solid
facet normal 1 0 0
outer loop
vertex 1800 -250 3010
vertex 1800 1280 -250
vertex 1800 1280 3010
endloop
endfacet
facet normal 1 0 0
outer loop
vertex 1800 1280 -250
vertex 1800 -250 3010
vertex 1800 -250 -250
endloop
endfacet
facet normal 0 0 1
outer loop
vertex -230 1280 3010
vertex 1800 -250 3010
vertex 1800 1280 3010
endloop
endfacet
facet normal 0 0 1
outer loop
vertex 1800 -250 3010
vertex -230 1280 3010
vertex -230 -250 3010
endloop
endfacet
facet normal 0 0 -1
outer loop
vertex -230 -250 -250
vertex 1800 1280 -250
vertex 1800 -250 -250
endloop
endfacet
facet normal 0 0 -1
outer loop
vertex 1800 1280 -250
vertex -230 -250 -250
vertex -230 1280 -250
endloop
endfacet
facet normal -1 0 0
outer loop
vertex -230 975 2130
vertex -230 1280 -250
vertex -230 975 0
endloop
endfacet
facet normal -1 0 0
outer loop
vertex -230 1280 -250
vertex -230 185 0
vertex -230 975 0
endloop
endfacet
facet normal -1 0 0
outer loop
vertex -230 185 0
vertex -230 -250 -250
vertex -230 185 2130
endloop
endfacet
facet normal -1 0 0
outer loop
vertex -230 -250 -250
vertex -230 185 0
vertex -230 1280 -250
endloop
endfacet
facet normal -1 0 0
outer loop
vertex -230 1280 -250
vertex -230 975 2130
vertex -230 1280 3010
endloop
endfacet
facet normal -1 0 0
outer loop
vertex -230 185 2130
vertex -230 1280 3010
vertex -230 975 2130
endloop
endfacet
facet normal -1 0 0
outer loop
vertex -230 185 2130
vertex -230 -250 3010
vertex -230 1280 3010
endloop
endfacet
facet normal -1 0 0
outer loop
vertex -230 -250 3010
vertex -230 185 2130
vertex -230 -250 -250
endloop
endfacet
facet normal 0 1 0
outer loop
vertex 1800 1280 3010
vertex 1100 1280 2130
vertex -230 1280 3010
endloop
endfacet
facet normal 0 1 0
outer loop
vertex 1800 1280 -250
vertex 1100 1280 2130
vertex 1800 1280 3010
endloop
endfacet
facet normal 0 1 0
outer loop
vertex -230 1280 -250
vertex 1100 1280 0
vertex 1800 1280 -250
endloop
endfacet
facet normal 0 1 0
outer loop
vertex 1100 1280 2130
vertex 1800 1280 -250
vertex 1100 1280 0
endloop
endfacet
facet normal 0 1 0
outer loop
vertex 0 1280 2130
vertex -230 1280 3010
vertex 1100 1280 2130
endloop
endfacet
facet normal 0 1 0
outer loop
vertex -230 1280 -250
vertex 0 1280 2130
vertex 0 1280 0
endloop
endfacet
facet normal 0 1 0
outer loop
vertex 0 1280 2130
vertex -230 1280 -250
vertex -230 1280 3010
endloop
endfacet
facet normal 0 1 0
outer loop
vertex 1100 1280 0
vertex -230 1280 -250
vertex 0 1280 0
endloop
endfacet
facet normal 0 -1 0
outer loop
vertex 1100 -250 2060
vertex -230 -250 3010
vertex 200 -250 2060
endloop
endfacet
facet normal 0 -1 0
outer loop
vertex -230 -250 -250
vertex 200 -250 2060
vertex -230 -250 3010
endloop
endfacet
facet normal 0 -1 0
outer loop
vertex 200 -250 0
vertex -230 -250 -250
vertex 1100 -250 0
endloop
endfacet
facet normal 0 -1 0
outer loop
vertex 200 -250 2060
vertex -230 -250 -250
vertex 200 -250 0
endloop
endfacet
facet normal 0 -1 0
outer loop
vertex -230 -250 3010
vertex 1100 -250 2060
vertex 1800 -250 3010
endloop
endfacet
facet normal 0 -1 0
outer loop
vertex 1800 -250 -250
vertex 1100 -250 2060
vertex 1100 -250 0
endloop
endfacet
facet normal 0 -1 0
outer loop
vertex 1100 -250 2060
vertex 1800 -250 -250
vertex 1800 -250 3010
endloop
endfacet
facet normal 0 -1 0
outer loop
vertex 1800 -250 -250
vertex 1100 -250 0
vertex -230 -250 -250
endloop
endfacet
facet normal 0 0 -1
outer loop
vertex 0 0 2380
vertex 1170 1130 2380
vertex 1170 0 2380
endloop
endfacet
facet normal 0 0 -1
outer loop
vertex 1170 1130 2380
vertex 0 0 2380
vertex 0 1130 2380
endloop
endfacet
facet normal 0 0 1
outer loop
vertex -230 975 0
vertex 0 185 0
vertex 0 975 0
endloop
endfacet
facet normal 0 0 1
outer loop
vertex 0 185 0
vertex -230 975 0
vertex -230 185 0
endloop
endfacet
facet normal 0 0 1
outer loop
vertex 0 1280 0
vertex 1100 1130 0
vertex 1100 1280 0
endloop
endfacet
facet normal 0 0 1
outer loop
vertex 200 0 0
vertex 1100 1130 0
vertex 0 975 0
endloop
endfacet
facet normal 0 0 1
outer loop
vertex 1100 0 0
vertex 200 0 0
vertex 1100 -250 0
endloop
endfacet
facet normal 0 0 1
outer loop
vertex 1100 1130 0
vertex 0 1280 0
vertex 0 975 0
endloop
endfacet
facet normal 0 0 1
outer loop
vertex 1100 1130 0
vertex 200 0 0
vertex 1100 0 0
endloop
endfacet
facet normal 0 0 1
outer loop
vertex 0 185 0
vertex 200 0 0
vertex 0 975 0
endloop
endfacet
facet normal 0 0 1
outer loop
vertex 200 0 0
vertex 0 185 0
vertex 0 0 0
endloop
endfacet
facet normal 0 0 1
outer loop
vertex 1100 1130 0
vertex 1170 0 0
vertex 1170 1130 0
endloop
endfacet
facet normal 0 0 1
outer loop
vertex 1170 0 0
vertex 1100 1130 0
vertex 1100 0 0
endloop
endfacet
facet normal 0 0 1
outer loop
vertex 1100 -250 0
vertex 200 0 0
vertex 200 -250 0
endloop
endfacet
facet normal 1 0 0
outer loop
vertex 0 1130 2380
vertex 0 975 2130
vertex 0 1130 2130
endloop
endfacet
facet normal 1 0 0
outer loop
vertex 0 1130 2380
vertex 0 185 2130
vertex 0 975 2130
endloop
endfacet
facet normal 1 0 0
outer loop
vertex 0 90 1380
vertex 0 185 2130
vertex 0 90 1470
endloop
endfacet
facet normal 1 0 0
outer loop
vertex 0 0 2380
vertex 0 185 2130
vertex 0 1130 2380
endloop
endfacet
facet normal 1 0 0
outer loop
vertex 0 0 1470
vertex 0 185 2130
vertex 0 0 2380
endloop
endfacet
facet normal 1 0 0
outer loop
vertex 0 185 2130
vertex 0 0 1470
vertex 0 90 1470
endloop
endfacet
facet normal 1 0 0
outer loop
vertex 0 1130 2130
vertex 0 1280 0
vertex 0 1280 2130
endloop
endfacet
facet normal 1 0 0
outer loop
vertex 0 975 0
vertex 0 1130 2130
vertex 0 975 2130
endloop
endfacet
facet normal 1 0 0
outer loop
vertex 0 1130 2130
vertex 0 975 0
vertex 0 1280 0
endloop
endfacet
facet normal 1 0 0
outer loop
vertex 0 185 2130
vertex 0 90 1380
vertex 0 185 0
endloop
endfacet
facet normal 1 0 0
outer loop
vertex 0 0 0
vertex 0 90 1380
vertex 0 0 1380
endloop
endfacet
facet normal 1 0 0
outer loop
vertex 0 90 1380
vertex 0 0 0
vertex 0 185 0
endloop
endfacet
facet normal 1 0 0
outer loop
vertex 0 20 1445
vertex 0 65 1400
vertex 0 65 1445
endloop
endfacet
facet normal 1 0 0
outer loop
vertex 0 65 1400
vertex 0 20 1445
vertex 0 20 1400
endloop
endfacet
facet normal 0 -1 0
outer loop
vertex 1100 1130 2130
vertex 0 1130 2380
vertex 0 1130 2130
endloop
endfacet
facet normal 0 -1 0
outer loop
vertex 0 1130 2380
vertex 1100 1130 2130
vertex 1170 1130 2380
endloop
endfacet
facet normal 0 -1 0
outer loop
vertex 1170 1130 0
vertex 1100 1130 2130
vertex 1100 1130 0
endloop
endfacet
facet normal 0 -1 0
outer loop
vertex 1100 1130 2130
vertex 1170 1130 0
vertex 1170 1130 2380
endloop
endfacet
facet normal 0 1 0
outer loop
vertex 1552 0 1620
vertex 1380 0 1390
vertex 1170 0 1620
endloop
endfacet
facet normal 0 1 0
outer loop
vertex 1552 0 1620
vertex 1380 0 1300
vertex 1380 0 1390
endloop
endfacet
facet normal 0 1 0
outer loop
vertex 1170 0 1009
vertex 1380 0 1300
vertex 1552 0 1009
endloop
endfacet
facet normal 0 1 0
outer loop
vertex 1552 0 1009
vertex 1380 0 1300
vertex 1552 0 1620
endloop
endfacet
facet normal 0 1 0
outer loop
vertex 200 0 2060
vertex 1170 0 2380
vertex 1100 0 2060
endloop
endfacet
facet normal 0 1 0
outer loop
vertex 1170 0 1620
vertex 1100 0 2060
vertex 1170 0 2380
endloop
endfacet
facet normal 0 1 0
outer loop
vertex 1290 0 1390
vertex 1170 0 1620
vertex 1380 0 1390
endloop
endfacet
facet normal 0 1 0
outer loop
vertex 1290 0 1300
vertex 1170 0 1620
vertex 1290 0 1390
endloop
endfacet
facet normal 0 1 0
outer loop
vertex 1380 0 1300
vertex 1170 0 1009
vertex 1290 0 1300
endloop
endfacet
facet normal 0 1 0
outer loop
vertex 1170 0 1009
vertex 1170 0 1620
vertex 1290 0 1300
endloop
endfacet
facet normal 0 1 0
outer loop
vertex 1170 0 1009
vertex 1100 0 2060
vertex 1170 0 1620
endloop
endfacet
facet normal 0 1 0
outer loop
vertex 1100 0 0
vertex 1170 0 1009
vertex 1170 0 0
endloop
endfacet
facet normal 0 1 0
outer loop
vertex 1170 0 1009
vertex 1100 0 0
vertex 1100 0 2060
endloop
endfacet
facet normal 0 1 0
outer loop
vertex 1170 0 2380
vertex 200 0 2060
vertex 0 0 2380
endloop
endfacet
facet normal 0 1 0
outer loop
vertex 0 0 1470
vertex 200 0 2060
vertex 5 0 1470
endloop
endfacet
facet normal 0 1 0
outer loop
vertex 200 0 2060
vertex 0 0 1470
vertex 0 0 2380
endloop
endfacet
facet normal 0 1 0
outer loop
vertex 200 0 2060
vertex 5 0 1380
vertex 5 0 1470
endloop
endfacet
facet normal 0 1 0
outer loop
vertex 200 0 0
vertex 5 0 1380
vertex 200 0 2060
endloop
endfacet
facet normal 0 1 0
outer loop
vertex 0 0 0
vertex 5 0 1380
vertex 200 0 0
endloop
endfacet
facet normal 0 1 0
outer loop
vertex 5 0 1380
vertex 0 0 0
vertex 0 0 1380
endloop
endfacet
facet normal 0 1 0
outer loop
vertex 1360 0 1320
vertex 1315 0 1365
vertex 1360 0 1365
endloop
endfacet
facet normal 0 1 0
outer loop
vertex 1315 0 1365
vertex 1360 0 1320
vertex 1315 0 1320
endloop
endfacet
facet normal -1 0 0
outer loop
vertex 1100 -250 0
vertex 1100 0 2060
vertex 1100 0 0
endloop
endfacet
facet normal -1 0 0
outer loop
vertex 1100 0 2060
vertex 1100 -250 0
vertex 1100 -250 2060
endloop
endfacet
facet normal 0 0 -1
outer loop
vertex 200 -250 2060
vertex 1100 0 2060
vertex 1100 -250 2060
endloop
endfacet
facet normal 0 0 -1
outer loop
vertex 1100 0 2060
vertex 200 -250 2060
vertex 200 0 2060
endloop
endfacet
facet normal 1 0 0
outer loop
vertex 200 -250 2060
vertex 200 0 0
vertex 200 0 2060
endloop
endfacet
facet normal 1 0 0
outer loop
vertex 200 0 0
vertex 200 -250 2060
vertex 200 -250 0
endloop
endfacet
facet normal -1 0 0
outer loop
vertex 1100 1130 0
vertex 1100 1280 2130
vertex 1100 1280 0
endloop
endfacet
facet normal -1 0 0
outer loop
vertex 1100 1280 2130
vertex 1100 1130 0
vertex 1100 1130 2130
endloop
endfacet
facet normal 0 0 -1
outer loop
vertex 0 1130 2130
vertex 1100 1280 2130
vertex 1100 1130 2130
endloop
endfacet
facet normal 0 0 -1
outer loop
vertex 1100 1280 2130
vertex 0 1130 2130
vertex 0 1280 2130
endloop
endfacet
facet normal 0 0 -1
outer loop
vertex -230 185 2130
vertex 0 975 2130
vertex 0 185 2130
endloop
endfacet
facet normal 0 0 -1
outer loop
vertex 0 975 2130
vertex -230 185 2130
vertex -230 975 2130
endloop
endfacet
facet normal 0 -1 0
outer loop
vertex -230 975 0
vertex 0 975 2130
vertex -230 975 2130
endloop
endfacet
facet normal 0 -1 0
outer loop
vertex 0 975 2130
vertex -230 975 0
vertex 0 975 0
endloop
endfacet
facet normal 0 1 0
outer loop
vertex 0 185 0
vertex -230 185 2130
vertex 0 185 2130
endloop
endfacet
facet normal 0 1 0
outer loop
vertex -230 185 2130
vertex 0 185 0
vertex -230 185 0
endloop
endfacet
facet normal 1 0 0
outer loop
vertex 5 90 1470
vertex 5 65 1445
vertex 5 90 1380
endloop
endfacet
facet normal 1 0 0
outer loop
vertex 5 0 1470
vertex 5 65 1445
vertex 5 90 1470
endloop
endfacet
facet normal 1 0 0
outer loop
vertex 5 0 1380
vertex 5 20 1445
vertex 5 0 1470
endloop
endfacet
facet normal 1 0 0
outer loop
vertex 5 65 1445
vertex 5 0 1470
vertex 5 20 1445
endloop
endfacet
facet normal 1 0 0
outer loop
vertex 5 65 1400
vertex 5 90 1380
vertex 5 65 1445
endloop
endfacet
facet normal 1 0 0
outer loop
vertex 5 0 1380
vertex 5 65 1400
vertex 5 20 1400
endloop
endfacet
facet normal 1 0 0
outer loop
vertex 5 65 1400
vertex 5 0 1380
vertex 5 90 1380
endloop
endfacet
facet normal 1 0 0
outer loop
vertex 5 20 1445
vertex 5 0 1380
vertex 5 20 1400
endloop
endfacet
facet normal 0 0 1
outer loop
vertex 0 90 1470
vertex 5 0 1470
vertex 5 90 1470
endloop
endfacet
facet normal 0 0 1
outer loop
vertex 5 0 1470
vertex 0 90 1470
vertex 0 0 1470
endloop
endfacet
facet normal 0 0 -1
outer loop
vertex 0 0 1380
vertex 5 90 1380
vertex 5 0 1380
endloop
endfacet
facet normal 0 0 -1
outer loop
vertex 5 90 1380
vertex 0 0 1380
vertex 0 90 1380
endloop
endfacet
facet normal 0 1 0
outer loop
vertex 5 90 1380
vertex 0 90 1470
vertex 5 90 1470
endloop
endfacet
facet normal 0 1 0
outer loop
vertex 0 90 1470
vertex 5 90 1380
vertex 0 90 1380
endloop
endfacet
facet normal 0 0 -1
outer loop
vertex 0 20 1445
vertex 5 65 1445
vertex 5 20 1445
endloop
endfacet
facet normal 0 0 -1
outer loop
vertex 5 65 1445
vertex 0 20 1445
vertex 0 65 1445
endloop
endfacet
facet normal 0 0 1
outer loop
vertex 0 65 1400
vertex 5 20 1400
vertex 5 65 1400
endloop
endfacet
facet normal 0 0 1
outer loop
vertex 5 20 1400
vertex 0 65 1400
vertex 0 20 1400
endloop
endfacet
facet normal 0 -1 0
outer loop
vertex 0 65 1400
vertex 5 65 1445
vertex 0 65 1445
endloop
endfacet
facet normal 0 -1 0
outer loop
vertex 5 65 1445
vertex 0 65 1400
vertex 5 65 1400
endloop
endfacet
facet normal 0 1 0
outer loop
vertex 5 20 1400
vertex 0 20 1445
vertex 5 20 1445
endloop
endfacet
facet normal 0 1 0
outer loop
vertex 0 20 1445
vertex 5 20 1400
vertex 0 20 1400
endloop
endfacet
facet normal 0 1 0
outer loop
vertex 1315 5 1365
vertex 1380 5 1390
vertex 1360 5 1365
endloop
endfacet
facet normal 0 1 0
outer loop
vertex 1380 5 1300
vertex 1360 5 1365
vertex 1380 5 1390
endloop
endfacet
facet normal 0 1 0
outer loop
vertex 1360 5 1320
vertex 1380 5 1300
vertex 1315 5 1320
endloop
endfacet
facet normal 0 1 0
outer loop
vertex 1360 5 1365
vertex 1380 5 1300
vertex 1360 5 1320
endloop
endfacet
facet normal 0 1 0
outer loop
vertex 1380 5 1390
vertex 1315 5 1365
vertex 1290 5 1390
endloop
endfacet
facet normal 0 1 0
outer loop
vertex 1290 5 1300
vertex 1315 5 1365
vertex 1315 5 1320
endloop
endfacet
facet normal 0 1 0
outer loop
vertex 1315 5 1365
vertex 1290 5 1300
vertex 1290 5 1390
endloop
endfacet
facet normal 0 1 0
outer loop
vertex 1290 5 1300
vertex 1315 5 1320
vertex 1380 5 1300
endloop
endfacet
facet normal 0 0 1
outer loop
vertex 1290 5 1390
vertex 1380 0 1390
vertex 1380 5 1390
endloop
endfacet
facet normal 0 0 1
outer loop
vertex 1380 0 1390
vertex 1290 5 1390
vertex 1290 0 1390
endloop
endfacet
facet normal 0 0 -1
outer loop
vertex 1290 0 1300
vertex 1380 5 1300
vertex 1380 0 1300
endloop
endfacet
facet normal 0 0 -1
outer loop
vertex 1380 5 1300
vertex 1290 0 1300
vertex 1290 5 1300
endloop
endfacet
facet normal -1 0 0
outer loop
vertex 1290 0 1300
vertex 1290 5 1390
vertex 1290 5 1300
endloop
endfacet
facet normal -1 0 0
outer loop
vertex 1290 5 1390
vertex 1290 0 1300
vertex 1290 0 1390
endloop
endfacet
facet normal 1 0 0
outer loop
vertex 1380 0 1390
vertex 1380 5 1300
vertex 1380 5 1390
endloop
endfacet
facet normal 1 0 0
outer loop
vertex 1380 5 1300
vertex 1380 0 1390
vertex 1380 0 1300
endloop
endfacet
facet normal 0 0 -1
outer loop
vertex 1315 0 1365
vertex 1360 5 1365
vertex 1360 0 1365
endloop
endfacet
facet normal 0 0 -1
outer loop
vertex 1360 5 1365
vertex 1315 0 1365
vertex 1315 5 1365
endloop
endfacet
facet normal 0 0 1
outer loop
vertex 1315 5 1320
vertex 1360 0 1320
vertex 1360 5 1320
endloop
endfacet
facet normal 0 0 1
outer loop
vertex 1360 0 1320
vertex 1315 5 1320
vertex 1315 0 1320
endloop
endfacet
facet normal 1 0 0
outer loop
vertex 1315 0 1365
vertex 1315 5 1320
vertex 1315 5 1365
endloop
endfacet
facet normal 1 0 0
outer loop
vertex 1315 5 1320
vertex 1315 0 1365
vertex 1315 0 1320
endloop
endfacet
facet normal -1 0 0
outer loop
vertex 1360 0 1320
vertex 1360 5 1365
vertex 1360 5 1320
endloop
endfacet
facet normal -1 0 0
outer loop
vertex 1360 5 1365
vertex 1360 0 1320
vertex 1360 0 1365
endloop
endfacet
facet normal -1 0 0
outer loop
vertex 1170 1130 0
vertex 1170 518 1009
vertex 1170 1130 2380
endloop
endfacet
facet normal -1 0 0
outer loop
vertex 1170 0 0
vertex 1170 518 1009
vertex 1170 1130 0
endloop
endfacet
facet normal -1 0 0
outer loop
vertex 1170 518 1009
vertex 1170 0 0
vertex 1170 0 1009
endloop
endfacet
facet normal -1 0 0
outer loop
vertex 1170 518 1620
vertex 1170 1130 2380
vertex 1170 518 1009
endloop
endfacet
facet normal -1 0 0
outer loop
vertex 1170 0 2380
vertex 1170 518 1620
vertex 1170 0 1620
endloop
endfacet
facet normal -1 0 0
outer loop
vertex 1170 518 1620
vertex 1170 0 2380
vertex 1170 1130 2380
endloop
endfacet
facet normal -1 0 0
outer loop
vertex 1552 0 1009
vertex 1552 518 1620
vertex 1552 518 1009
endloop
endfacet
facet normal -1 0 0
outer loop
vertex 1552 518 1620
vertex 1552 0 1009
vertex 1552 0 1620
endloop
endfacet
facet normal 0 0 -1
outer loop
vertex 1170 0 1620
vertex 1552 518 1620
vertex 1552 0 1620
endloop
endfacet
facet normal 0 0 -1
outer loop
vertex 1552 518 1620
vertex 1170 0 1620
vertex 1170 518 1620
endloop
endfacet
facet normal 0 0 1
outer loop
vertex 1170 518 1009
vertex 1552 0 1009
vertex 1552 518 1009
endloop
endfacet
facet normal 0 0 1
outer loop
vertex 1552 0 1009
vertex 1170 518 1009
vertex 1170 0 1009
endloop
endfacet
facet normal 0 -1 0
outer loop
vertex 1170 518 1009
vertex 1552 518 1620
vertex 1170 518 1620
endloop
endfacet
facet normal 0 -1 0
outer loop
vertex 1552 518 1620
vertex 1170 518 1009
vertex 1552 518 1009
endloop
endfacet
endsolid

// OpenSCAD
// file: parts.scad
//插座示意图
module socket()
{
difference(){
cube([5,90,90]);
translate([0,40,50])
cube([5,5,15]);
translate([0,30,25])
cube([5,5,15]);
translate([0,50,25])
cube([5,5,15]);
}
}
//定义4个方向插座,都以右上角对准原点
module left_socket(){
translate([0,-90,-90])
socket();
}
module right_socket(){
translate([-5,90,0])
left_socket();
}
module up_socket(){
rotate(90,[0,0,1])
right_socket();
}

module down_socket(){
translate([90,5,0])
up_socket();
}

//开关示意图
module switch()
{
difference(){
cube([5,90,90]);
translate([0,20,20])
cube([5,45,45]);
}

}

//定义4个方向的开关,都以开关右上角对准原点
module left_switch(){
translate([0,-90,-90])
switch();
}

module right_switch(){
translate([-5,0,-90])
switch();
}

module down_switch(){
translate([90,0,-90])
rotate(90,[0,0,1])
switch();
}

module up_switch(){
translate([-90,0,-90])
rotate(90,[0,0,-1])
switch();
}
//吸顶灯示意图
module light(){
translate([0,0,-50])
cylinder(50,80,110,center);
}
//x方向墙半径r,深deep的空洞模型
module xhole(r,deep){
rotate(90,[0,1,0])
cylinder(deep,r,r,center);
}
//xhole(30,100);
//light();
module right_bathlight(){
translate([-35,0,0])
union(){
sphere(25);
translate([15,0,0])
rotate(90,[0,1,0])
cylinder(25,12,12,center);
}
}
module down_bathlight(){
rotate(90,[0,0,-1])
right_bathlight();
}


module alert_box(){
translate([-5,0,-90])
difference(){
cube([5,90,90]);

rotate(90,[0,1,0])
translate([-45,45,0])
cylinder(6,10,10,center);

}

}
alert_box();
// file: cabinets.scad
//Cabinets柜子集合


//次卧衣柜(左下角原点)
module tatami_wardrobe(){
cube([1520,600,2400]);
}

//tatami_wardrobe();


//tatami
//左下角原点
module tatami(){
cube([2790,2470,500]);

}
//tatami();

//鞋柜
module shoe(){
difference(){
cube([400,1140,2400]);
translate([0,0,2400-80-700-611])
cube([400-18,518,611]);
}
}
//shoe();

//主卧衣柜
module wardrobe(){
cube([2100,600,2770]);
}
//wardrobe();

//书柜
module bookcase(){
difference(){
union(){
cube([620,750+680,780]);
translate([0,750+680,0])
cube([1520,600,780]);
translate([0,750+680+250,780])
cube([1520,350,1590]);
}

translate([50,750+680,0])
cube([1442,600-18,780-36]);
translate([18,36+750+36,100])
cube([620-18,250,780-36-100]);
translate([18,36,0])
cube([620-18,750,780-36]);
translate([18,750+680+250,780])
cube([1510-2*18,350-18,590]);
}
}
bookcase();
// main file
use<cabinets.scad>
use<parts.scad>

//鞋柜门廊空间
module porch(){

//进门门厅墙厚度
enter_wall_thick = 250;
//厨房和次卫墙厚度
side_wall_thick = 230;
//与客厅隔墙厚度
kt_wall_thick =150;

//面对进门水平方向长度
length = 1570;
//垂直大门，鞋柜空间宽度
width = 1130;
//高度
height = 2760;
//吊顶
top = 380;
//门洞距离吊顶高度
door_top = 320;



union(){
difference(){
//外墙空间
translate([-side_wall_thick,-enter_wall_thick,-enter_wall_thick])
cube([(length+2*side_wall_thick), (width+enter_wall_thick+kt_wall_thick), (height+2*enter_wall_thick)]);
//墙内空间
cube([length,width,height-top]);
//大门门洞
translate([200,-enter_wall_thick,0])
cube([900,enter_wall_thick,height-top-door_top]);
//客厅门洞
translate([0,width,0])
cube([1100,kt_wall_thick,2130]);
//客卫门洞
translate([-side_wall_thick,185,0])
cube([side_wall_thick,790,2130]);
}
//进门左手墙次卫开关
translate([0,0,1380])
switch();

//进门右手墙门廊开关
translate([90+1100+190,0,1300])
rotate(90,[0,0,1])
switch();

translate([1570-400,0,0])
shoe();
}

}
porch();
